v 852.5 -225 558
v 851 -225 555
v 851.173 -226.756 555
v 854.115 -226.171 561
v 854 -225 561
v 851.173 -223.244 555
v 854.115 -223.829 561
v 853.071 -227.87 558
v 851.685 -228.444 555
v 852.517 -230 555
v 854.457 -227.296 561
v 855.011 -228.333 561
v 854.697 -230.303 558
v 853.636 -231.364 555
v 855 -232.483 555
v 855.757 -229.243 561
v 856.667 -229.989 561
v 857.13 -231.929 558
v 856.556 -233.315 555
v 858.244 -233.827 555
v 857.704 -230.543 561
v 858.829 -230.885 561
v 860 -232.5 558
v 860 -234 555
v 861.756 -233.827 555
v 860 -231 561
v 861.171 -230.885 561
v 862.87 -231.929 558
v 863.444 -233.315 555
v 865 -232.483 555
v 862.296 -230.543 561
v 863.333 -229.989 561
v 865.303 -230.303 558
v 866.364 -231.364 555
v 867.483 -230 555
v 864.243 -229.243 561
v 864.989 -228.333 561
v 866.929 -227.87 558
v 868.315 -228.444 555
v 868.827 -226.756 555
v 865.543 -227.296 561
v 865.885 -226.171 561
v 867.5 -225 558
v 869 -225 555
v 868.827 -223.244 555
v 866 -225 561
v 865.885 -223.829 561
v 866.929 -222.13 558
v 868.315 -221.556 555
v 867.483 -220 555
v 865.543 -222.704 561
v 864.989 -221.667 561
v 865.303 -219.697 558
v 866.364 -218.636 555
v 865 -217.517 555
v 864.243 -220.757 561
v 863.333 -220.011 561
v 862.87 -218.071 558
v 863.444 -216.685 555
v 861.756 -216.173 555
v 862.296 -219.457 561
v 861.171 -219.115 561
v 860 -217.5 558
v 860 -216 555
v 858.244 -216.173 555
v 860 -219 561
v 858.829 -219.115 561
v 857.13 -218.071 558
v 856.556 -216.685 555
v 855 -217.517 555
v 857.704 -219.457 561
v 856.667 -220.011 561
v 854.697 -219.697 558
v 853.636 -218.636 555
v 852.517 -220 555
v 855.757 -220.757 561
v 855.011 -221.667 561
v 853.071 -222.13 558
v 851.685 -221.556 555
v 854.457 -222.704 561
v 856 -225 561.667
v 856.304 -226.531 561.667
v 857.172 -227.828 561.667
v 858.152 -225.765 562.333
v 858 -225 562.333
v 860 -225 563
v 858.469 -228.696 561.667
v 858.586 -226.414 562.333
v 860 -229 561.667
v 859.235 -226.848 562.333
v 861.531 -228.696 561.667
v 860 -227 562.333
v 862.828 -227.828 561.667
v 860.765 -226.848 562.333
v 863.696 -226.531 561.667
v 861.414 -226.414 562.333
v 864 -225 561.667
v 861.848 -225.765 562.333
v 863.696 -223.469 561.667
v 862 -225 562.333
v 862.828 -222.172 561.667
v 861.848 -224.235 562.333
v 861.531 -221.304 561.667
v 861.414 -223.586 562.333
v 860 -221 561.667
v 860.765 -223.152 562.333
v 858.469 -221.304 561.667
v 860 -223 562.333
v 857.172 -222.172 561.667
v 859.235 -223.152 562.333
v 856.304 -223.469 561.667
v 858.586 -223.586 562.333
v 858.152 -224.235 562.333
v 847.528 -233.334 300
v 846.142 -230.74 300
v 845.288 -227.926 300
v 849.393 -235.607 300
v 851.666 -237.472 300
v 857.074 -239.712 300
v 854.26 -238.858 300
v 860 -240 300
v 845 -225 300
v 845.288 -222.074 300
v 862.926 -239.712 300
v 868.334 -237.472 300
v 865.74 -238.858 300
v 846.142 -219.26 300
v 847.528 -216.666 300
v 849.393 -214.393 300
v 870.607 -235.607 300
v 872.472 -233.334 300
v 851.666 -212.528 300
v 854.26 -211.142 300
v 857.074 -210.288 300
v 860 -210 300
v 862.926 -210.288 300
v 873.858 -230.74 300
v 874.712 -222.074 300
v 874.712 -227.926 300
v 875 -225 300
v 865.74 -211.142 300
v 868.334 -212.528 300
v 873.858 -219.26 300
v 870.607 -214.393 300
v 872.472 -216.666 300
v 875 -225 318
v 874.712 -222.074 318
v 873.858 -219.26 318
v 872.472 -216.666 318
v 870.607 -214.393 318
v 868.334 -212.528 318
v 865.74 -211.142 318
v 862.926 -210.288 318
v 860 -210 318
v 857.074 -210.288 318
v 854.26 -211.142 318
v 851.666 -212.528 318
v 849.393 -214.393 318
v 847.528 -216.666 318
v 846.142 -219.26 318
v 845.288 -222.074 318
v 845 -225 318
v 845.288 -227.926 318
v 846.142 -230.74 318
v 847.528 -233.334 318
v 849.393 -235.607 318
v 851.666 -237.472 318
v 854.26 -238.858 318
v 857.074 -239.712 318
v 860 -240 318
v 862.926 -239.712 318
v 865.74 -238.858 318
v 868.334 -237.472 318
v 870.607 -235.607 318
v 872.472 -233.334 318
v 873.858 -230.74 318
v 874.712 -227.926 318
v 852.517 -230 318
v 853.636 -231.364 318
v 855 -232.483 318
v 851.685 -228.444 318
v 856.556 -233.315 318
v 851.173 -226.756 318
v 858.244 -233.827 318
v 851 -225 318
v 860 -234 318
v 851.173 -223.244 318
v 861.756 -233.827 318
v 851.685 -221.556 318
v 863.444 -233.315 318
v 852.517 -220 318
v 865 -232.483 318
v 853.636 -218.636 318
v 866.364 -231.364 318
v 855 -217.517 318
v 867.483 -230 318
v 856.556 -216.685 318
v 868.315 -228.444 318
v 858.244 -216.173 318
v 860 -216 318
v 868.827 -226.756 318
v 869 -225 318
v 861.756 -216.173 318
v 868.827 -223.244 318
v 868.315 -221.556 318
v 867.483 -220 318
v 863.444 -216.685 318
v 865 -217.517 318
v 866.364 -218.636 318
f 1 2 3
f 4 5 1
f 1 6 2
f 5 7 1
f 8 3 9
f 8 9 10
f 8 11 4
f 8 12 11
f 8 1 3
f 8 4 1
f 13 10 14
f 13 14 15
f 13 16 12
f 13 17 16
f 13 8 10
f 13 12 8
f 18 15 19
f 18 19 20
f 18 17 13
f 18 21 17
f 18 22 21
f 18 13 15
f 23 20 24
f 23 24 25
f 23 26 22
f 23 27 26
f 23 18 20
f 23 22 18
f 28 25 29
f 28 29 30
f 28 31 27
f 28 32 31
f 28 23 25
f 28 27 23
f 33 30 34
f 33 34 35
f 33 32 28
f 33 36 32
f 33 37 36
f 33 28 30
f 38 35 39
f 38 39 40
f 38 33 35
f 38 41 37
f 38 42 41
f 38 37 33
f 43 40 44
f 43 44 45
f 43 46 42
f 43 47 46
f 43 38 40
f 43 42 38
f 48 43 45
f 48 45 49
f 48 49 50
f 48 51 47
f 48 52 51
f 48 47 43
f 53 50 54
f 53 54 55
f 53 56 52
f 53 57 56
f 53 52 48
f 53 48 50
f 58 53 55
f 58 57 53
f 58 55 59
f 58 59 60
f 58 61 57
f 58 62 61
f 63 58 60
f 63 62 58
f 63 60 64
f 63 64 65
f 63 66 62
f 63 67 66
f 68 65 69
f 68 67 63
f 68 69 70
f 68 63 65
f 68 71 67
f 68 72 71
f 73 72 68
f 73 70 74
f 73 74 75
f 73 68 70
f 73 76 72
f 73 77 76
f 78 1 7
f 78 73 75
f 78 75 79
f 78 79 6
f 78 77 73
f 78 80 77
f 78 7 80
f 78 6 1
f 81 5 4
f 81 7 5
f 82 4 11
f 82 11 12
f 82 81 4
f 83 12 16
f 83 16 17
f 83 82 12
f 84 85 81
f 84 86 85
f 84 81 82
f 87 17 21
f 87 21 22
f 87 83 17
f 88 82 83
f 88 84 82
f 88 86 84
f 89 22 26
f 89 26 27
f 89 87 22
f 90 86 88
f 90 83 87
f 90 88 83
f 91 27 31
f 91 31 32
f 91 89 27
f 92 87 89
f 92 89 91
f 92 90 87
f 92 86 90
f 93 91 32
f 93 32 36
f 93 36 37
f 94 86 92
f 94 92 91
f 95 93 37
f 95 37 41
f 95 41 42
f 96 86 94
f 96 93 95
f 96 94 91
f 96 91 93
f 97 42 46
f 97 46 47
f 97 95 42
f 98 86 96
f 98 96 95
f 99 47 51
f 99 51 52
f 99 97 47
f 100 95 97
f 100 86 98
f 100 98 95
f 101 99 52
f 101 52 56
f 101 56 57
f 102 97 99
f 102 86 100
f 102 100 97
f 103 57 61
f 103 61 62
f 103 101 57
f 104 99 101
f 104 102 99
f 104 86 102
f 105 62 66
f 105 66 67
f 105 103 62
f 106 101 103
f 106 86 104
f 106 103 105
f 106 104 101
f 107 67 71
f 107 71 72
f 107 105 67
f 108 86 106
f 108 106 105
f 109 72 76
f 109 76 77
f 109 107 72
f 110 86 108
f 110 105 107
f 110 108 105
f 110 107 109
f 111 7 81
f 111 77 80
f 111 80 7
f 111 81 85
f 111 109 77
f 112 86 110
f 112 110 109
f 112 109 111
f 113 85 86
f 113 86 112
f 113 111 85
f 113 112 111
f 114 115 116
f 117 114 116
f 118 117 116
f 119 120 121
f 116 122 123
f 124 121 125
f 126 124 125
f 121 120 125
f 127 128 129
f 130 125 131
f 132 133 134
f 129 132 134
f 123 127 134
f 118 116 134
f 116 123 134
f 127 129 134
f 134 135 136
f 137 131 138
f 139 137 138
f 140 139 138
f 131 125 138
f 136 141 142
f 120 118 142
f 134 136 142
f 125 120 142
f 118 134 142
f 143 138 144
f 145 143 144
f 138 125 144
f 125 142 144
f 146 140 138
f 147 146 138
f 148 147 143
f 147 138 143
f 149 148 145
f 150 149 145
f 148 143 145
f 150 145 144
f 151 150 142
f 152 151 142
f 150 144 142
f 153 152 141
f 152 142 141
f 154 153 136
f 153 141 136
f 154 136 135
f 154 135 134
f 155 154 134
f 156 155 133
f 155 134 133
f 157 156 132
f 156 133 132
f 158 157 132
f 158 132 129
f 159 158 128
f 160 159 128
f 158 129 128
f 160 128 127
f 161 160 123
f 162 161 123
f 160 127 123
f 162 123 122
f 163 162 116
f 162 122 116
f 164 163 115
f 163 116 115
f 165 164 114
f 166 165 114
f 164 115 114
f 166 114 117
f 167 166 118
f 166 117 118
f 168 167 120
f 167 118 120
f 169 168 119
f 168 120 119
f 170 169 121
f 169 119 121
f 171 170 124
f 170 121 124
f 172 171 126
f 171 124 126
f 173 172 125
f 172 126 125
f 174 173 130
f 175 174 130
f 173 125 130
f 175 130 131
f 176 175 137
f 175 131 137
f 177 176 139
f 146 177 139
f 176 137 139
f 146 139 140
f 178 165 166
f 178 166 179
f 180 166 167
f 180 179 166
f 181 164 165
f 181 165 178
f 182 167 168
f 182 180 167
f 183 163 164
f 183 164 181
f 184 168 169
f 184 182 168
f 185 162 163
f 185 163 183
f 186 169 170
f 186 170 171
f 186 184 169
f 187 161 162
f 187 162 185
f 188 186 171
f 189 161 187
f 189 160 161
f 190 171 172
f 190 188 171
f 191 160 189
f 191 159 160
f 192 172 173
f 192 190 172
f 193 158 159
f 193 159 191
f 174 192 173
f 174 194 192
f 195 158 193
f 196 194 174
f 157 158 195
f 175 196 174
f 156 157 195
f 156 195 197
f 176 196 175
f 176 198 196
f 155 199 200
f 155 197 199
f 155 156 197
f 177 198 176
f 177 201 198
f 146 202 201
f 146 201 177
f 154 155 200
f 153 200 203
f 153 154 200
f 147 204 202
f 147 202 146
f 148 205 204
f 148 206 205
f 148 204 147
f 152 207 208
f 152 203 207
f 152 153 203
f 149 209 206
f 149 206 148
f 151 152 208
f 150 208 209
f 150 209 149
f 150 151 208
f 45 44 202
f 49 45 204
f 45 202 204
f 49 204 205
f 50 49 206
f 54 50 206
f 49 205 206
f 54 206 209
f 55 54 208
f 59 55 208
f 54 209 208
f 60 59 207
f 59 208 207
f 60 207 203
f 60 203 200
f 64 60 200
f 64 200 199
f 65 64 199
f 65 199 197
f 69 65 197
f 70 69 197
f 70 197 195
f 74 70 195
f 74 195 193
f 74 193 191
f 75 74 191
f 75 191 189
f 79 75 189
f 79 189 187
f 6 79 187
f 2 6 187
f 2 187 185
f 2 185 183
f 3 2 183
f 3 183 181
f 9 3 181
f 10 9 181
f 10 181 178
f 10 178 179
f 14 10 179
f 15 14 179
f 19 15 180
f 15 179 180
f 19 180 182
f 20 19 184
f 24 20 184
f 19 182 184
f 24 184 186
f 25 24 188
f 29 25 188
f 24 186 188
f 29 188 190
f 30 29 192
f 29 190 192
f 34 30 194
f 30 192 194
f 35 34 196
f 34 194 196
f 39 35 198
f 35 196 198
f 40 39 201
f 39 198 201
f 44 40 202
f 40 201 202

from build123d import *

# Parameters (mm, degrees)
EXTRUDE_START      = 300
EXTRUDE_SKETCH_1_R = 15
EXTRUDE_1_DEPTH    = 18
EXTRUDE_START_2    = 318
EXTRUDE_SKETCH_2_R = 9
EXTRUDE_2_DEPTH    = 237


with BuildPart() as part:
    # Extrude sketch 1 → Extrude 1 (new body)
    with BuildSketch(Plane.XY.offset(EXTRUDE_START)):
        with Locations((860, -225)):
            Circle(EXTRUDE_SKETCH_1_R)
    extrude(amount=EXTRUDE_1_DEPTH)


with BuildPart() as body_2:
    # Extrude sketch 2 → Extrude 2 (new body)
    with BuildSketch(Plane.XY.offset(EXTRUDE_START_2)):
        with Locations((860, -225)):
            Circle(EXTRUDE_SKETCH_2_R)
    extrude(amount=EXTRUDE_2_DEPTH)


with BuildPart() as body_3:
    # Revolve profile 1 → Revolve 1 (revolve)
    with BuildSketch(Plane(origin=(0, -225, 0), x_dir=(1, 0, 0), z_dir=(0, 1, 0))):
        Polygon((860, -555), (869, -555), (866, -561), (860, -563), align=None)
    revolve(axis=Axis((860, -225, 550), (0, 0, 1)))


with BuildPart() as part_1:
    add(part.part)

    # Combine (weld / assembly of features): union body 2, body 3
    add(body_2.part)
    add(body_3.part)


solid = part_1.part
